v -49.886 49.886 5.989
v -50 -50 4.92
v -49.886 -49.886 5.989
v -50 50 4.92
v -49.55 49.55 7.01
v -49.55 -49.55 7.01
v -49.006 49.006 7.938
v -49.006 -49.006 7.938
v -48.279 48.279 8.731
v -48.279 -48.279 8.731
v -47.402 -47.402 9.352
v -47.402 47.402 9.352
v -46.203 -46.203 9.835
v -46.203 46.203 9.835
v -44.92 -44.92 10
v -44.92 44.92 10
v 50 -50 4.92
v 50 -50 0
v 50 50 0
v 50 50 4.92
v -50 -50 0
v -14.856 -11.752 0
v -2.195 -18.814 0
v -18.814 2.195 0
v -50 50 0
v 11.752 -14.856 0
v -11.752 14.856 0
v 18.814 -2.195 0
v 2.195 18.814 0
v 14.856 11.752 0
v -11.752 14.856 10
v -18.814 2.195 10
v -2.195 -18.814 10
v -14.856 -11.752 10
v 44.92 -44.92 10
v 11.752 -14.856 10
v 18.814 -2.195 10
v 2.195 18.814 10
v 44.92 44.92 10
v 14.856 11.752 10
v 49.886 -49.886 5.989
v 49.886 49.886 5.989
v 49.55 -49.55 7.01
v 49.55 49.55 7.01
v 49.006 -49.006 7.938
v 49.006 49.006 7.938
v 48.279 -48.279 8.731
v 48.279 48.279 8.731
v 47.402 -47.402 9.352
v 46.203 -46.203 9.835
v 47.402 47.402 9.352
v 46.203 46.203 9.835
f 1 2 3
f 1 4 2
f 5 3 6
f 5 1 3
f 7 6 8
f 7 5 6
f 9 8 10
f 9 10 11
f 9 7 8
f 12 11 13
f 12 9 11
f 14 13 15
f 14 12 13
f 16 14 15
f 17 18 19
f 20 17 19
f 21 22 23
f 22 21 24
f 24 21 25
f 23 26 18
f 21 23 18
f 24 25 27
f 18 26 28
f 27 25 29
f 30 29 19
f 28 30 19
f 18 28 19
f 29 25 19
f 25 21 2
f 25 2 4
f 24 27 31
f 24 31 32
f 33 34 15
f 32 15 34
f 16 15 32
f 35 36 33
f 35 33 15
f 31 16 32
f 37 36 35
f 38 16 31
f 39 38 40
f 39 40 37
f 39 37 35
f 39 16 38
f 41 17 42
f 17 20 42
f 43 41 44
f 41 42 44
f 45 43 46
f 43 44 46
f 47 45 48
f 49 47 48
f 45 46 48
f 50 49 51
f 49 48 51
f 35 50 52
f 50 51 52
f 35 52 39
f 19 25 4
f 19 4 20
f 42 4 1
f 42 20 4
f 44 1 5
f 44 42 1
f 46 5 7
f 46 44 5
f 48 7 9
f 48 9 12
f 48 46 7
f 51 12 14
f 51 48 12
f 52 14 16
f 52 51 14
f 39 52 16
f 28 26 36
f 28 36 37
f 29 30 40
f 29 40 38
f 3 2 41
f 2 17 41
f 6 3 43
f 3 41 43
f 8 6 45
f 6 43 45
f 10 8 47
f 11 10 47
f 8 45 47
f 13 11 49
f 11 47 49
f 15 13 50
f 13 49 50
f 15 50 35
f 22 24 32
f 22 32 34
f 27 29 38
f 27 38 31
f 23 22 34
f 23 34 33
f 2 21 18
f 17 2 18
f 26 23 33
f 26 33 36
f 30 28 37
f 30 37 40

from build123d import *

# Parameters (mm, degrees)
F0_W     = 100
F0_H     = 100
F2_DEPTH = 10
F3_R     = 5.08
F4_DEPTH = 61.976


# Not quite as in the source:
# - a feature of the source that left no trace in its solid (it failed there, or was rolled back) is left out


with BuildPart() as f2:
    # F0 (on Top) → F2 (new body)
    with BuildSketch(Plane.XY):
        Rectangle(F0_W, F0_H)
    extrude(amount=F2_DEPTH)

    # F3
    f3_edges = [f2.edges().sort_by_distance(p)[0] for p in [
        (0, 50, 10),
        (-50, 0, 10),
        (0, -50, 10),
        (50, 0, 10),
    ]]
    fillet(f3_edges, radius=F3_R)

    # F1 (on face) → F4 (cut)
    with BuildSketch(Plane.XY):
        Polygon((-11.7515370065, 14.8558261646), (-18.8142469277, 2.1950639145), (-14.8558261646, -11.7515370065), (-2.1950639145, -18.8142469277), (11.7515370065, -14.8558261646), (18.8142469277, -2.1950639145), (14.8558261646, 11.7515370065), (2.1950639145, 18.8142469277), align=None)
    extrude(amount=F4_DEPTH, mode=Mode.SUBTRACT)


solid = f2.part
